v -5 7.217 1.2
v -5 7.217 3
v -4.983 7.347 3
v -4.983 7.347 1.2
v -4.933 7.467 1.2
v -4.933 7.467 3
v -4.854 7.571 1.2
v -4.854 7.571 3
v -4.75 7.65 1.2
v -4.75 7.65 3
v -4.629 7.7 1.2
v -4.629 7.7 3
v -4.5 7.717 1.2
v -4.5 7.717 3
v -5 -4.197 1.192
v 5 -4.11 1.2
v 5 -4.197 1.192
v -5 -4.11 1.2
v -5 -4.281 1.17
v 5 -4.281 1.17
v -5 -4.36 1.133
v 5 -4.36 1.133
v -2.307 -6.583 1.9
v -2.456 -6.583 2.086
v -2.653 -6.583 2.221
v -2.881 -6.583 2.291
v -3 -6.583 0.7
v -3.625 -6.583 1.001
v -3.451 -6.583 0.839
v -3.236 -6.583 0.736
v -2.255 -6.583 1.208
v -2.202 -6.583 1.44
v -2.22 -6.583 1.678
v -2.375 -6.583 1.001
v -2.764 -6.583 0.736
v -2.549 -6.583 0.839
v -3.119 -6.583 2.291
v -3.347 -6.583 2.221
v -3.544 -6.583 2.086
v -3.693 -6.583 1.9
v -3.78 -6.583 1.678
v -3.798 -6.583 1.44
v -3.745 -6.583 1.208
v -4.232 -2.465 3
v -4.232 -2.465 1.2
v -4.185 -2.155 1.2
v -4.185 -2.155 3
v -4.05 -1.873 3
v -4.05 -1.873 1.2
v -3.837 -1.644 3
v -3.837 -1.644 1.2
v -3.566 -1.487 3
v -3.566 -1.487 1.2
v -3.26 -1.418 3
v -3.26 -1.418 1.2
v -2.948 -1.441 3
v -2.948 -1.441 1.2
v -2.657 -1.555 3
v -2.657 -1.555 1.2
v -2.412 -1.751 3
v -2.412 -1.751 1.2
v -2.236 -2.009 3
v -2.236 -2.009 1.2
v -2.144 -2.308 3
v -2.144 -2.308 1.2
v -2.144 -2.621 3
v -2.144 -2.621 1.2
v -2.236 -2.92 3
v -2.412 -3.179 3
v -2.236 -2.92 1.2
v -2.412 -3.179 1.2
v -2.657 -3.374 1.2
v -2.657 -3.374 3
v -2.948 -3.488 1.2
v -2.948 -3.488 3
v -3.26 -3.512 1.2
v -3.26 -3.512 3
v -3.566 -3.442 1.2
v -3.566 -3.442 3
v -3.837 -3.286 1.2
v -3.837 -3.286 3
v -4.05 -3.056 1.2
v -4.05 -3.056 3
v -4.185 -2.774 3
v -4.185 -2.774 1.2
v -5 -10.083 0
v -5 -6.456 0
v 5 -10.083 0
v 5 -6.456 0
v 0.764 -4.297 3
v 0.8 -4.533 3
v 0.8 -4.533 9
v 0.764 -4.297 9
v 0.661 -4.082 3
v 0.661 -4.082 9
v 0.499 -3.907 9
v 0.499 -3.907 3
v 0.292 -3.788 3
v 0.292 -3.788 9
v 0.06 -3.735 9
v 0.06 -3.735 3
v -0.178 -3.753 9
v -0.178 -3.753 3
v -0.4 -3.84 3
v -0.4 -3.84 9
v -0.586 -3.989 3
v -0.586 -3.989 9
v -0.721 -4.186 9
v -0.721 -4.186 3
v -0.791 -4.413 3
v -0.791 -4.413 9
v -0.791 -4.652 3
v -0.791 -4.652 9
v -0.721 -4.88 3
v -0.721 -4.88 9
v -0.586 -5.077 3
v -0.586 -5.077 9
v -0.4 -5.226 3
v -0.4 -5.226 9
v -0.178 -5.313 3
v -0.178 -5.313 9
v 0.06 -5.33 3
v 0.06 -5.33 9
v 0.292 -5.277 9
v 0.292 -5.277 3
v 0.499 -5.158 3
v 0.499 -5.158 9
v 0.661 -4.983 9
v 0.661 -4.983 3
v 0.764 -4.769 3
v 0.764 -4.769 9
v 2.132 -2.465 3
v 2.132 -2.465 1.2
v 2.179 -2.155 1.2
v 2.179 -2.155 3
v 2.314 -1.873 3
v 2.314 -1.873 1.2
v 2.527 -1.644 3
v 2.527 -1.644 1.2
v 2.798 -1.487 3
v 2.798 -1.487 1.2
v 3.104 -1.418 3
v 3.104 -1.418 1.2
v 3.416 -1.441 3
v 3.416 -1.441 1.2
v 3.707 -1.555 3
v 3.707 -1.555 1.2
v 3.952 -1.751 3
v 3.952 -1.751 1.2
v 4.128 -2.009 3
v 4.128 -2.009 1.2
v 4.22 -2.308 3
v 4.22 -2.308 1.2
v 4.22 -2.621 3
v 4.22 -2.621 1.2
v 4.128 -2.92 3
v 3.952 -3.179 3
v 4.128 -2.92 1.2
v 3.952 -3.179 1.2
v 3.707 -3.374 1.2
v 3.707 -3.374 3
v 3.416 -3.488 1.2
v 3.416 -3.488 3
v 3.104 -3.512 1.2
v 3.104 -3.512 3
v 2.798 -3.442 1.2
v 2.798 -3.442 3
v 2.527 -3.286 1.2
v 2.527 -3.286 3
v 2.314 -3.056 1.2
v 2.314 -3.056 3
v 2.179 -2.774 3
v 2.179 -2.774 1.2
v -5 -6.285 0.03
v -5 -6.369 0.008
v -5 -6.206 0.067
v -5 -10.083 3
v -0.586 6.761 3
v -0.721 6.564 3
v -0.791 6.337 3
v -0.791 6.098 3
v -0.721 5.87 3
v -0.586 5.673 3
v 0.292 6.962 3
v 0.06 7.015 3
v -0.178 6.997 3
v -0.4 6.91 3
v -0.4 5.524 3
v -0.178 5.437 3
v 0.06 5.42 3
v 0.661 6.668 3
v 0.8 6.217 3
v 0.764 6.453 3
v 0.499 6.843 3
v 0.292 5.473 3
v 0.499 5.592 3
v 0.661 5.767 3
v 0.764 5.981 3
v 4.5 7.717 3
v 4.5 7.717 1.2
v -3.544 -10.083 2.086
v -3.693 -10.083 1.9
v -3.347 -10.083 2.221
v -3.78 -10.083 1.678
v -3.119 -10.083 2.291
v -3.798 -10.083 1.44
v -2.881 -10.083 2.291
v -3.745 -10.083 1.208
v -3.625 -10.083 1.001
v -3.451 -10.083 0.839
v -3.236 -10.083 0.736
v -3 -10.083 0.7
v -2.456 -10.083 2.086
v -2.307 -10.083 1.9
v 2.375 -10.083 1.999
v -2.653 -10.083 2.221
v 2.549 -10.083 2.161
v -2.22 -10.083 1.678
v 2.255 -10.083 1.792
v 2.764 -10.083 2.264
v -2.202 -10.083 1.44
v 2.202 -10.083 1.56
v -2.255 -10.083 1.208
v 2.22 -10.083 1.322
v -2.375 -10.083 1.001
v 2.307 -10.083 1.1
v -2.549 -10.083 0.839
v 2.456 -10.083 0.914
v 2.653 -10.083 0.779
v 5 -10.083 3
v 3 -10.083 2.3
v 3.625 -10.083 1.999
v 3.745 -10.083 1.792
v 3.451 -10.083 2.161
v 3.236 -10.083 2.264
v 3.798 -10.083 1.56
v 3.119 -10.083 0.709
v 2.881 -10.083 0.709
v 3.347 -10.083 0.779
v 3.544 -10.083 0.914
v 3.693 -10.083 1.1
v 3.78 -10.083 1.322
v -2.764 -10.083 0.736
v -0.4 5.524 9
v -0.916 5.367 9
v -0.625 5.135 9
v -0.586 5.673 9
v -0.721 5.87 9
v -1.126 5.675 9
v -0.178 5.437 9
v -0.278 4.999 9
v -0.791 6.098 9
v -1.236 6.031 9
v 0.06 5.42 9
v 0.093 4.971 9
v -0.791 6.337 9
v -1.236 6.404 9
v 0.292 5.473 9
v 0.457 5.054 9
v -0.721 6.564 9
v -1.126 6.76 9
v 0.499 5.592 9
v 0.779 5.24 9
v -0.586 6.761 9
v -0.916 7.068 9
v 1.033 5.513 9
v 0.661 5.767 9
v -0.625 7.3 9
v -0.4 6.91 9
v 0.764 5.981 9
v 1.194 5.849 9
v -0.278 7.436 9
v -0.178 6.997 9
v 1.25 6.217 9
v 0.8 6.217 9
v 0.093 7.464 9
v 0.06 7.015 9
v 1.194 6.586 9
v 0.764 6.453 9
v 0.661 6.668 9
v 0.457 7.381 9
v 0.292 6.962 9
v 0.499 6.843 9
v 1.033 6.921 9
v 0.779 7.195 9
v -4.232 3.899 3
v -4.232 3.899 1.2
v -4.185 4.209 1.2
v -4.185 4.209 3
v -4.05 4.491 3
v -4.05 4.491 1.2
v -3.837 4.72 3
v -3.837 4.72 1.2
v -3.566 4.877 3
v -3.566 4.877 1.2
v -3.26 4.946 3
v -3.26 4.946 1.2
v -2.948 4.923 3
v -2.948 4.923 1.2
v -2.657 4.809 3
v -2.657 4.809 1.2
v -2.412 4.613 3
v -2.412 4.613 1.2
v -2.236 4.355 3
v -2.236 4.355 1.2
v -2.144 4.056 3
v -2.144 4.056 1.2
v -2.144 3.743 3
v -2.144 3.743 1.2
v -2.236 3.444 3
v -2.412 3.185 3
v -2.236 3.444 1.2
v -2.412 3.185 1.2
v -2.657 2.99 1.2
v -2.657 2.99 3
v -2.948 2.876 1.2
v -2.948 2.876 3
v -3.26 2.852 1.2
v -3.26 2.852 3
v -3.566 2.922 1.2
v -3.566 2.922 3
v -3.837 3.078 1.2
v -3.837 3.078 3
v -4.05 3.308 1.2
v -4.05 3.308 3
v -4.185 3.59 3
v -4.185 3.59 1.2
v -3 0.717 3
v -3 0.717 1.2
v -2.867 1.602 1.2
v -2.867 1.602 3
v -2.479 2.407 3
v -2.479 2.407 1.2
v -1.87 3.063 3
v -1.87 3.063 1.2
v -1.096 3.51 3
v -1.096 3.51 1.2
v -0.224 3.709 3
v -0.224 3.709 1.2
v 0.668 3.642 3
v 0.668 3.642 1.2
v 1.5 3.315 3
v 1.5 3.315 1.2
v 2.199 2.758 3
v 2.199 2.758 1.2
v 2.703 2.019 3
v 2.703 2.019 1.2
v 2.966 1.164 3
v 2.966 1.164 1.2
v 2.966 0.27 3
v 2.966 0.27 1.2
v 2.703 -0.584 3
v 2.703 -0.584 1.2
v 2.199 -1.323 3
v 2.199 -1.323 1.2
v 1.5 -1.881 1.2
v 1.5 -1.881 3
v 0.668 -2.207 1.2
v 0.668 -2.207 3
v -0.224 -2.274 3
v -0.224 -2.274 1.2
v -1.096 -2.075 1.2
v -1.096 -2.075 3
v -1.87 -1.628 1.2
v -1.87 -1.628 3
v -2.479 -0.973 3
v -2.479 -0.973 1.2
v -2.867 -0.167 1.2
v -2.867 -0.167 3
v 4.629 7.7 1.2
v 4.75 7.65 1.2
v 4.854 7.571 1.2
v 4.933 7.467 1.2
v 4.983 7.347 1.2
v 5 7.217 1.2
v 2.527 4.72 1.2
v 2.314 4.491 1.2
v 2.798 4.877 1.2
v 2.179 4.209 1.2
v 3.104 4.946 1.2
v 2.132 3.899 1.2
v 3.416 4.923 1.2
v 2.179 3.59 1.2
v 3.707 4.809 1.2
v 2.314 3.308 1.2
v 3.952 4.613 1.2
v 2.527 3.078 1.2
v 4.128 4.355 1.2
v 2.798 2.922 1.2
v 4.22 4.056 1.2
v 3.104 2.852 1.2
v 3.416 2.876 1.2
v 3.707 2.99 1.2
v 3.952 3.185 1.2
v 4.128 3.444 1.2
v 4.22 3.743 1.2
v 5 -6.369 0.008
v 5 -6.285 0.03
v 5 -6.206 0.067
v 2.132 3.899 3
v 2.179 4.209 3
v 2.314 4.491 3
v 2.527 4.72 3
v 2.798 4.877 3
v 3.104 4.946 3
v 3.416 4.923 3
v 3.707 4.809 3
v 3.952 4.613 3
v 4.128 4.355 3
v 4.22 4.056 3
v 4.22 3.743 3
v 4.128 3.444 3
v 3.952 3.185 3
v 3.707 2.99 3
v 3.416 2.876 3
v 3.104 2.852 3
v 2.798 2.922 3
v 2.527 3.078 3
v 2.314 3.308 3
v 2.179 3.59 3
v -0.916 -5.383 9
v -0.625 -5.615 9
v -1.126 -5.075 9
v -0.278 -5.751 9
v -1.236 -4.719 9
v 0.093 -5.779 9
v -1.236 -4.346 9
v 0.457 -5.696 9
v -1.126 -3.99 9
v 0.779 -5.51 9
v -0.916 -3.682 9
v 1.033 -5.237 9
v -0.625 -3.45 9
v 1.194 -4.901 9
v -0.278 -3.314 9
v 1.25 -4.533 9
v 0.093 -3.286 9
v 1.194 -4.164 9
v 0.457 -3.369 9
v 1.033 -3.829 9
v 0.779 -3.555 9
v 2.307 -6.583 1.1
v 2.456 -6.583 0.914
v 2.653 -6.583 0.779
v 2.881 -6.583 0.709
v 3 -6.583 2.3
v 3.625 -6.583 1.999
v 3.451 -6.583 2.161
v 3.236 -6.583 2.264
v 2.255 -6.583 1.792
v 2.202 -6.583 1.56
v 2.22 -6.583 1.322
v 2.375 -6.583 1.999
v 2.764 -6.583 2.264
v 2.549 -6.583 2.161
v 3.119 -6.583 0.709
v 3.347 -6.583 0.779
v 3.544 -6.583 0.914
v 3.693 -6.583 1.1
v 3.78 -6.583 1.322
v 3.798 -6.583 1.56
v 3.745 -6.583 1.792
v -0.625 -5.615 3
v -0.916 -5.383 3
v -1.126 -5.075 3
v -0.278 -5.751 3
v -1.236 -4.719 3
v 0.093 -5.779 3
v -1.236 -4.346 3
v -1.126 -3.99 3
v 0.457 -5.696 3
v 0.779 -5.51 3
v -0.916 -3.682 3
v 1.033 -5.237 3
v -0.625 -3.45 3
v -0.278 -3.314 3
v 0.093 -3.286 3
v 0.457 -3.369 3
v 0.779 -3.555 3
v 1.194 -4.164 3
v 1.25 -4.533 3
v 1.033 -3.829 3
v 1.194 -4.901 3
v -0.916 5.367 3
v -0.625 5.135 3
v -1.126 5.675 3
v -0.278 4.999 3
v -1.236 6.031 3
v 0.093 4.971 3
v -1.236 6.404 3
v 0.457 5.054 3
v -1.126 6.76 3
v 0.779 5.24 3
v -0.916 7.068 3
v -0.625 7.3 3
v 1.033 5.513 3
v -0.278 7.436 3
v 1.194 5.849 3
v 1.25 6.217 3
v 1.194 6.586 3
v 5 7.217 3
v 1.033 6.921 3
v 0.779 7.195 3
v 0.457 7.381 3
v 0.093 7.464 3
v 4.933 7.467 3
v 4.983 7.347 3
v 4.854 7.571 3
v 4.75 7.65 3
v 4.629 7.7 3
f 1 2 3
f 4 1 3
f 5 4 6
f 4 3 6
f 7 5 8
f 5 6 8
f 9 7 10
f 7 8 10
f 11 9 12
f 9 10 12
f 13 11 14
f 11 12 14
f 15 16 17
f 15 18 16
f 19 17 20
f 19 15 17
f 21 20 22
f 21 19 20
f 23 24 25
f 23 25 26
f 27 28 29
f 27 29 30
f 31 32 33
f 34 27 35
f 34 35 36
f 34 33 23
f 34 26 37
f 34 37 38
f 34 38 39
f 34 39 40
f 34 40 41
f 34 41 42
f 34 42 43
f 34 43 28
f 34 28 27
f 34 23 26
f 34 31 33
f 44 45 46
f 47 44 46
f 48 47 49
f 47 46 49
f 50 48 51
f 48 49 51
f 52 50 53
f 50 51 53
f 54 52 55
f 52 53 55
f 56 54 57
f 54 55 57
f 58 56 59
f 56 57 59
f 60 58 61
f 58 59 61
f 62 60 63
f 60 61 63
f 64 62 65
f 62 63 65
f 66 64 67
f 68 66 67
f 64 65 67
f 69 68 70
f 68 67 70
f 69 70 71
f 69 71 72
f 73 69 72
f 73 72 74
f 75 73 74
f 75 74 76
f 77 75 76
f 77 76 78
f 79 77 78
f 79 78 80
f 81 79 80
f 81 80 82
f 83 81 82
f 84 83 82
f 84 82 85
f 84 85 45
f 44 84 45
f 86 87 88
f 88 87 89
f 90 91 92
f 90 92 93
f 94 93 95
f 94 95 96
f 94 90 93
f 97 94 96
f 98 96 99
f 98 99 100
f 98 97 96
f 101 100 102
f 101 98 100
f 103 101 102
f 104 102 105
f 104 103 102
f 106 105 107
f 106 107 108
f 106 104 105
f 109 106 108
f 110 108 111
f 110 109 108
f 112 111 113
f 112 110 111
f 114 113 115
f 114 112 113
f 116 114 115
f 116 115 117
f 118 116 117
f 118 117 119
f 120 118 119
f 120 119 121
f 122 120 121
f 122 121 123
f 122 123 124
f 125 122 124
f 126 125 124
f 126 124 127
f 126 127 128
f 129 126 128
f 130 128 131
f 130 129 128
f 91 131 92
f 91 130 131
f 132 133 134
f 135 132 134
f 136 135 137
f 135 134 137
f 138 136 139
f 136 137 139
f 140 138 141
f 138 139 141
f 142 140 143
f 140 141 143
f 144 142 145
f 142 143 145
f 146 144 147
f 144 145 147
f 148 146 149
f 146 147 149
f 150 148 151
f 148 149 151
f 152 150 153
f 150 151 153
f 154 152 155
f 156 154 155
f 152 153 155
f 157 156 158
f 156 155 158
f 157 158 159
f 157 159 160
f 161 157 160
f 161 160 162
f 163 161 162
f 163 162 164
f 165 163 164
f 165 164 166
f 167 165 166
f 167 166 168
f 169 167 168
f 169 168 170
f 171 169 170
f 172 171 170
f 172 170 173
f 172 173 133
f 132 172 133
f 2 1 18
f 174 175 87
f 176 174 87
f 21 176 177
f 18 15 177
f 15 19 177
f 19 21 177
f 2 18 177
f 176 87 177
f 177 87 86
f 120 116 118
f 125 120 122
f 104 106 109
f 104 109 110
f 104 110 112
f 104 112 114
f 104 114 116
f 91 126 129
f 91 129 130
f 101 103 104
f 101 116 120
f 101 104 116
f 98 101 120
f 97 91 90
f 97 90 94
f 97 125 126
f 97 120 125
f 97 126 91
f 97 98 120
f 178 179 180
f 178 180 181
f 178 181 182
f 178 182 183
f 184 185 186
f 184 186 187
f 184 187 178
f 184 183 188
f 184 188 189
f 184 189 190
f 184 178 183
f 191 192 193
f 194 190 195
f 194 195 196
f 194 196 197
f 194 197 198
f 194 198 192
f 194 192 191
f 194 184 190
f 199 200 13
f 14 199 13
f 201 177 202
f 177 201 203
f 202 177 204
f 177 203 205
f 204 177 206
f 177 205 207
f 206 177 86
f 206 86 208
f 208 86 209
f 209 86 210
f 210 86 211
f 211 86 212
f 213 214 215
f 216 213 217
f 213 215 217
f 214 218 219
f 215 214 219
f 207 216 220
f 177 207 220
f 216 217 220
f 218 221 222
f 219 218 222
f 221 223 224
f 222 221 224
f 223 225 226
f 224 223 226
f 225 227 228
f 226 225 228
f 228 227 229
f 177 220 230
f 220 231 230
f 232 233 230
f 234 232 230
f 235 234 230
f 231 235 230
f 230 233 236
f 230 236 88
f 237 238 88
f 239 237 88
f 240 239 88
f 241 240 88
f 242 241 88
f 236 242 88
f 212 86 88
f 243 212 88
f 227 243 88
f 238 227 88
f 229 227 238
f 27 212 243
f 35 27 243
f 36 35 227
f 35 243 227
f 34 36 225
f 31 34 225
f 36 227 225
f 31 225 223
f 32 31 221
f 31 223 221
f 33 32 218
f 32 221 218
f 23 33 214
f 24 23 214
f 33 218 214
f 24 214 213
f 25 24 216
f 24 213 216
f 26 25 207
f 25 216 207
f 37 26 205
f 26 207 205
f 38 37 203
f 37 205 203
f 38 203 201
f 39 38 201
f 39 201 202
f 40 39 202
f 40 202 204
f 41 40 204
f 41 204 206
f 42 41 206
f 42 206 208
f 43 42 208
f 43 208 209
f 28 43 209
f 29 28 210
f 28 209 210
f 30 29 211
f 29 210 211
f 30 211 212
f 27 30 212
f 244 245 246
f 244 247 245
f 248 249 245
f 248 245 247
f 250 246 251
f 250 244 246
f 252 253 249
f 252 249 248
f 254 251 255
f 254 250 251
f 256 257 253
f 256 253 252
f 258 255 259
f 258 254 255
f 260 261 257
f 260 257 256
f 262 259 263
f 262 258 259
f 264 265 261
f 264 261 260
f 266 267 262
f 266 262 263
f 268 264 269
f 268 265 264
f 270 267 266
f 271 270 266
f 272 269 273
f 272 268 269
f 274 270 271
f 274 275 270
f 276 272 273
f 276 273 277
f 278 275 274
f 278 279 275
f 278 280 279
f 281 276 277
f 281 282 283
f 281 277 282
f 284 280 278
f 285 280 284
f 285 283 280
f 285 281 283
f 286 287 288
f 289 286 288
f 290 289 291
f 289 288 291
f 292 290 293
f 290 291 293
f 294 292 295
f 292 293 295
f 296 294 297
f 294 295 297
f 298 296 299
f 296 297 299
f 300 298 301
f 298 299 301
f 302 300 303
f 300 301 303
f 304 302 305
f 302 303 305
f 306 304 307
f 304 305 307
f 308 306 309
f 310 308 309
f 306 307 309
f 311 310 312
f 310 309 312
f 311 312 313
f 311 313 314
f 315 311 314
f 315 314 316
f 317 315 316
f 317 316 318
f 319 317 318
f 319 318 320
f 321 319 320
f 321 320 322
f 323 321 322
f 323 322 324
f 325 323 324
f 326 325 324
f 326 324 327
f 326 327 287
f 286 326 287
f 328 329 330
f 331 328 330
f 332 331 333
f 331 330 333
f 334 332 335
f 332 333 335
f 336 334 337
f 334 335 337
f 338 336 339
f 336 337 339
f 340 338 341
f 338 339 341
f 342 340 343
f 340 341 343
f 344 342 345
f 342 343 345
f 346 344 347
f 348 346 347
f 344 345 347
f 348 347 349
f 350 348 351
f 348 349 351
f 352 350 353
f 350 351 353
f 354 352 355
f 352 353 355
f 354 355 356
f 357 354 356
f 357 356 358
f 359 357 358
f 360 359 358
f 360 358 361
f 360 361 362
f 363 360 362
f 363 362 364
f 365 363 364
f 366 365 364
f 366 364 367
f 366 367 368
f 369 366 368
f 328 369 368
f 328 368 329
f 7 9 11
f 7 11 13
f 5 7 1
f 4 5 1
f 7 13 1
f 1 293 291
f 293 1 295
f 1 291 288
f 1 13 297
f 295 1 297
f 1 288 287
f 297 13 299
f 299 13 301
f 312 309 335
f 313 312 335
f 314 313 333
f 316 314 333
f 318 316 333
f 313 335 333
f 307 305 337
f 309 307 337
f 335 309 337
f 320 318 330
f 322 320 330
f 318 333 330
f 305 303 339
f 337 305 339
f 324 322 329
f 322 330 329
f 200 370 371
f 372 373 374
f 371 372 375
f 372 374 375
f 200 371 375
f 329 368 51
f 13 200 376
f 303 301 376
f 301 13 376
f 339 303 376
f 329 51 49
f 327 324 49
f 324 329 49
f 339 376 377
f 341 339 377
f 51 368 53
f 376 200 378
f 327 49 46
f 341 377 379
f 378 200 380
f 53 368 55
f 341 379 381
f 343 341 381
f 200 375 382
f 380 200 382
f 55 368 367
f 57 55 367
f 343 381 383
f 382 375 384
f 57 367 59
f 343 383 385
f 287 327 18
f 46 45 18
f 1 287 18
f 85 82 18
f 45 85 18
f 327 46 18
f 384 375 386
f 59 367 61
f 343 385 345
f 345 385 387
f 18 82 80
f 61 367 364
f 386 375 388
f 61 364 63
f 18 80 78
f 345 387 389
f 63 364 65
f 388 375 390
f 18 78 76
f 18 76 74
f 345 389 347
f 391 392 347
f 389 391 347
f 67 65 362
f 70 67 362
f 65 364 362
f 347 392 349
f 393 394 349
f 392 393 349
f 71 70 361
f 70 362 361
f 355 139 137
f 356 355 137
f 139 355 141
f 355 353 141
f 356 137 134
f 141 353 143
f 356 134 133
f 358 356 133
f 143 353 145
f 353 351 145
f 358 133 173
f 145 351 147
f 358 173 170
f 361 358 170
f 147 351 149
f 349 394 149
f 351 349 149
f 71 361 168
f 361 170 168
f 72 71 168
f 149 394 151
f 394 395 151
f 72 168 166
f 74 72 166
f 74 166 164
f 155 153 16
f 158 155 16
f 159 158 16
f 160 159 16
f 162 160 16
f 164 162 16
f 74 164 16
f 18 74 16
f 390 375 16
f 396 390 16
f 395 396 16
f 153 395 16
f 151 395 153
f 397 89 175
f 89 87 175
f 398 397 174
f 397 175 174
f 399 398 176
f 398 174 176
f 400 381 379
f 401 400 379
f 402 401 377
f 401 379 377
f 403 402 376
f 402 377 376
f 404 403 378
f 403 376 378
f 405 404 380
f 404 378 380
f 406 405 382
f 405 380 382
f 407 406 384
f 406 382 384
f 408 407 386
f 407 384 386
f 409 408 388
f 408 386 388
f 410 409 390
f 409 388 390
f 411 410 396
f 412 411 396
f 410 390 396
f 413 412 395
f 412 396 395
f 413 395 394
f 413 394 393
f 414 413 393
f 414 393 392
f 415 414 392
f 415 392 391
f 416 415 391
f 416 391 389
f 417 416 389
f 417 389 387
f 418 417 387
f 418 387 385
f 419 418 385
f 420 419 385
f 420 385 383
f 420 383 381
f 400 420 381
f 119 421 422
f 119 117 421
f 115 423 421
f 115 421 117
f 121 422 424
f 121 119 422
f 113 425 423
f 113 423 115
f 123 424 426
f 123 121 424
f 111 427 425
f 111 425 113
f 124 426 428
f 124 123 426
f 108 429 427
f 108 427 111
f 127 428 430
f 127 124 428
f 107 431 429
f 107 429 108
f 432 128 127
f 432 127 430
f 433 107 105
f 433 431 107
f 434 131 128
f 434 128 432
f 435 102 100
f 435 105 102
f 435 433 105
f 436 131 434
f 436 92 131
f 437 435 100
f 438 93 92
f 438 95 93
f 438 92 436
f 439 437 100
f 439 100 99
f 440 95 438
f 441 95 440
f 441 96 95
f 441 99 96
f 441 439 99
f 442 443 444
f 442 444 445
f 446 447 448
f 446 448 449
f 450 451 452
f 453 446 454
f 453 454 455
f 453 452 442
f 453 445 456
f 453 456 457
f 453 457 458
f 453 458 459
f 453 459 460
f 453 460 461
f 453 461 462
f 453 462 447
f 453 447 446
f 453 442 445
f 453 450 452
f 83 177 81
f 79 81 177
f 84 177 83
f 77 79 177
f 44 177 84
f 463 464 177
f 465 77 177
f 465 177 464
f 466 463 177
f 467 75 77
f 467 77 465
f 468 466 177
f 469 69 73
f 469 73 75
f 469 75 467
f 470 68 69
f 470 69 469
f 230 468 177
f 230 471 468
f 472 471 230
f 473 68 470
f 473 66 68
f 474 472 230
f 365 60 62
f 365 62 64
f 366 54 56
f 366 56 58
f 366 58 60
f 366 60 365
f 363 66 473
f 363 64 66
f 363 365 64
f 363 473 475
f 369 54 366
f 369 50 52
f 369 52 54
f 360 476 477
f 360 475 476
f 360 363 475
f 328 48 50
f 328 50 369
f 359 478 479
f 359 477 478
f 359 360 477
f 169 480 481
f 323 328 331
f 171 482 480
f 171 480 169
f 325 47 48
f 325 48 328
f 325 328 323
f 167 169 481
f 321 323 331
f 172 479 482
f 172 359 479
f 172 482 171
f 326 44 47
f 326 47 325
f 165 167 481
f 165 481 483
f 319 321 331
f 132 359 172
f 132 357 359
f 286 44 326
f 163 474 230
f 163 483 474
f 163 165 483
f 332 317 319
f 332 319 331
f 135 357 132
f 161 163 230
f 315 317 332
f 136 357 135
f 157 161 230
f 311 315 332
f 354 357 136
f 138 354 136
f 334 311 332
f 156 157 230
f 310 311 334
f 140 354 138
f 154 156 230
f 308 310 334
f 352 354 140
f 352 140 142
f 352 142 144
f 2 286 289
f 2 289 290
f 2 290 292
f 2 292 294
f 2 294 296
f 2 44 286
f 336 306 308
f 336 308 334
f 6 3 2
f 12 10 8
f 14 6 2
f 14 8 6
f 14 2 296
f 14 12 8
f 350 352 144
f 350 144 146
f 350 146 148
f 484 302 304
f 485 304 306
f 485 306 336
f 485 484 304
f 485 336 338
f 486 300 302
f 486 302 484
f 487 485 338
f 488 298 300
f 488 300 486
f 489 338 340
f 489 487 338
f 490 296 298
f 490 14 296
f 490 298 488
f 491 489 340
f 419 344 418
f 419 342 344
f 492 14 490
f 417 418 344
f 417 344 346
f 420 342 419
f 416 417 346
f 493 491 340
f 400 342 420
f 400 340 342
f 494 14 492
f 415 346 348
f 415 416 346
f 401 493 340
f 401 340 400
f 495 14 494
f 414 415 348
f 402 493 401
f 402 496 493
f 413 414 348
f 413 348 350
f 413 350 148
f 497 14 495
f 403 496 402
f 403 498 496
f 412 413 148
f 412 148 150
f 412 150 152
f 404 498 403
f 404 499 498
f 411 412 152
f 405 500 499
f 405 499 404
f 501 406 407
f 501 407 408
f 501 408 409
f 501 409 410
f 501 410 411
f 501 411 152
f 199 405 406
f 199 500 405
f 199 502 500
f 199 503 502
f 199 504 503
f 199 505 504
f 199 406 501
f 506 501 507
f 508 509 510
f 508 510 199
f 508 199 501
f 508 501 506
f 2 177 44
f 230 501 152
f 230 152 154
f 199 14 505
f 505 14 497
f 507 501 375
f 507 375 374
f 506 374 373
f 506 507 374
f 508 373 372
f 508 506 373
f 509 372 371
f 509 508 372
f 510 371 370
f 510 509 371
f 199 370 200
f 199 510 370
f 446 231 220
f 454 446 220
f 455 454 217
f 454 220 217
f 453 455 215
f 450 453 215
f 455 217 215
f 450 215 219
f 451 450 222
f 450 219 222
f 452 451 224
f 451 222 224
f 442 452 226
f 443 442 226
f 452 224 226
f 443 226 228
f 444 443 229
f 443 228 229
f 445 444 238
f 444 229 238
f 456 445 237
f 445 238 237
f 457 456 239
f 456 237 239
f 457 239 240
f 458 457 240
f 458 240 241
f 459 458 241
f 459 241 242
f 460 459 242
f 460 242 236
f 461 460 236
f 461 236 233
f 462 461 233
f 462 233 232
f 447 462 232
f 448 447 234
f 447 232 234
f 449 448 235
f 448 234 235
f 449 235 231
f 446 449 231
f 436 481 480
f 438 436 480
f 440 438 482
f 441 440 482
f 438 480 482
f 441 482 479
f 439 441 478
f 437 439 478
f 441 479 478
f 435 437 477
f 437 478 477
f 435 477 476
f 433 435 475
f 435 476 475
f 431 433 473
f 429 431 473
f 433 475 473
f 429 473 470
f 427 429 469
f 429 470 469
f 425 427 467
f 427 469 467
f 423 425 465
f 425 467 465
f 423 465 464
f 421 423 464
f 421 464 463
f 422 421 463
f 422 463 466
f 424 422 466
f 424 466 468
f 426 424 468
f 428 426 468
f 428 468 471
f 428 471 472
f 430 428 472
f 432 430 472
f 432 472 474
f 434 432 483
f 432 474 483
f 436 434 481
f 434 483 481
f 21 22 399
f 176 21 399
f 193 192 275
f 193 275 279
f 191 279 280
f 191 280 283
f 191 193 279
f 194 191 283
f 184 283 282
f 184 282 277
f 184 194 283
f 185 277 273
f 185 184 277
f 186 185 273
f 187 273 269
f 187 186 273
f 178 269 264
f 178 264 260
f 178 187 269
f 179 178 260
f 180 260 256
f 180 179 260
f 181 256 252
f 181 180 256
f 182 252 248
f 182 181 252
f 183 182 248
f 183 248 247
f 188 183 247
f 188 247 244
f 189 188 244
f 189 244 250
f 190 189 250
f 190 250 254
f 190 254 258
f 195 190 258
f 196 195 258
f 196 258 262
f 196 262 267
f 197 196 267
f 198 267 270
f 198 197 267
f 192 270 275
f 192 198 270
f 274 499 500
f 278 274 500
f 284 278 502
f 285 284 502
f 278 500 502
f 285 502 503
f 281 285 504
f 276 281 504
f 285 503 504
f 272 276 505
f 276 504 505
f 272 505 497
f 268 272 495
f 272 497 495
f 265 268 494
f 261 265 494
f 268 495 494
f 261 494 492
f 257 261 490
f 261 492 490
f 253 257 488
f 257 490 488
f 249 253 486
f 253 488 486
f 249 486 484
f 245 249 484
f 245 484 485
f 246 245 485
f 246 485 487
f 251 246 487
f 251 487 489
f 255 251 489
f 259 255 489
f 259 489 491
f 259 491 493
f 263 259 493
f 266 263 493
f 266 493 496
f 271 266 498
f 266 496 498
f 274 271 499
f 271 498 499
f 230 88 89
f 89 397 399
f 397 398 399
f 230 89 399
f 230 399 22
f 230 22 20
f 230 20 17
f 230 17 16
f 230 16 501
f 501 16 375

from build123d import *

# Parameters (mm, degrees)
EXTRUDE_1_DEPTH     = 3
SKETCH_2_R          = 0.8
CUT_EXTRUDE_1_DEPTH = 3.5
SKETCH_6_R          = 3
SKETCH_6_R_2        = 1.05
CUT_EXTRUDE_2_DEPTH = 5
FILLET_1_R          = 0.5
CUT_EXTRUDE_4_DEPTH = 15.514169722
FILLET_2_R          = 0.5
SKETCH_13_R         = 1.25
SKETCH_13_R_2       = 0.8
EXTRUDE_2_DEPTH     = 6


with BuildPart() as part:
    # 草图1 → 凸台-拉伸1 (new body)
    with BuildSketch(Plane.XY):
        Polygon((-5, -9.782714055), (-5, -10.082714055), (5, -10.082714055), (5, -4.612414327), (5, 7.717285945), (-5, 7.717285945), align=None)
    extrude(amount=EXTRUDE_1_DEPTH)

    # 草图2 → 切除-拉伸1 (cut)
    with BuildSketch(Plane(origin=(0, -10.082714055, 0), x_dir=(-1, 0, 0), z_dir=(0, -1, 0))):
        with Locations(Location((3, -1.5, 0), (0, 0, 90))):
            Circle(SKETCH_2_R)
        with Locations(Location((-3, -1.5, 0), (0, 0, 270))):
            Circle(SKETCH_2_R)
    extrude(amount=-CUT_EXTRUDE_1_DEPTH, mode=Mode.SUBTRACT)

    # 草图6 → 切除-拉伸2 (cut)
    with BuildSketch(Plane(origin=(0, 0, 0), x_dir=(-1, 0, 0), z_dir=(0, 0, -1))):
        with Locations((0, 0.717285945)):
            Circle(SKETCH_6_R)
        with Locations((-3.181980515, 3.89926646)):
            Circle(SKETCH_6_R_2)
        with Locations((3.181980515, 3.89926646)):
            Circle(SKETCH_6_R_2)
        with Locations((3.181980515, -2.46469457)):
            Circle(SKETCH_6_R_2)
        with Locations((-3.181980515, -2.46469457)):
            Circle(SKETCH_6_R_2)
    extrude(amount=-CUT_EXTRUDE_2_DEPTH, mode=Mode.SUBTRACT)

    # 圆角1
    fillet_1_edges = [part.edges().sort_by_distance(p)[0] for p in [
        (-5, 7.717285945, 1.5),
        (5, 7.717285945, 1.5),
    ]]
    fillet(fillet_1_edges, radius=FILLET_1_R)

    # 草图12 → 切除-拉伸4 (cut, through all)
    with BuildSketch(Plane(origin=(5, 0, 0), x_dir=(0, 0, -1), z_dir=(1, 0, 0))):
        Polygon((-1.2, 7.717285945), (-1.2, -4.243803332), (0, -6.322264301), (0, 7.717285945), align=None)
    extrude(amount=-CUT_EXTRUDE_4_DEPTH, mode=Mode.SUBTRACT)

    # 圆角2
    fillet_2_edges = [part.edges().sort_by_distance(p)[0] for p in [
        (0, -4.243803332, 1.2),
        (0, -6.322264301, 0),
    ]]
    fillet(fillet_2_edges, radius=FILLET_2_R)

    # 草图13 → 凸台-拉伸2 (add)
    # profile 1 of 2: a face of its own
    with BuildSketch(Plane.XY.offset(3)):
        with Locations((0, 6.217285945)):
            Circle(SKETCH_13_R)
        with Locations((0, 6.217285945)):
            Circle(SKETCH_13_R_2, mode=Mode.SUBTRACT)
    # profile 2 of 2: a face of its own
    with BuildSketch(Plane.XY.offset(3)):
        with Locations((0, -4.532714055)):
            Circle(SKETCH_13_R)
        with Locations((0, -4.532714055)):
            Circle(SKETCH_13_R_2, mode=Mode.SUBTRACT)
    extrude(amount=EXTRUDE_2_DEPTH)


solid = part.part
